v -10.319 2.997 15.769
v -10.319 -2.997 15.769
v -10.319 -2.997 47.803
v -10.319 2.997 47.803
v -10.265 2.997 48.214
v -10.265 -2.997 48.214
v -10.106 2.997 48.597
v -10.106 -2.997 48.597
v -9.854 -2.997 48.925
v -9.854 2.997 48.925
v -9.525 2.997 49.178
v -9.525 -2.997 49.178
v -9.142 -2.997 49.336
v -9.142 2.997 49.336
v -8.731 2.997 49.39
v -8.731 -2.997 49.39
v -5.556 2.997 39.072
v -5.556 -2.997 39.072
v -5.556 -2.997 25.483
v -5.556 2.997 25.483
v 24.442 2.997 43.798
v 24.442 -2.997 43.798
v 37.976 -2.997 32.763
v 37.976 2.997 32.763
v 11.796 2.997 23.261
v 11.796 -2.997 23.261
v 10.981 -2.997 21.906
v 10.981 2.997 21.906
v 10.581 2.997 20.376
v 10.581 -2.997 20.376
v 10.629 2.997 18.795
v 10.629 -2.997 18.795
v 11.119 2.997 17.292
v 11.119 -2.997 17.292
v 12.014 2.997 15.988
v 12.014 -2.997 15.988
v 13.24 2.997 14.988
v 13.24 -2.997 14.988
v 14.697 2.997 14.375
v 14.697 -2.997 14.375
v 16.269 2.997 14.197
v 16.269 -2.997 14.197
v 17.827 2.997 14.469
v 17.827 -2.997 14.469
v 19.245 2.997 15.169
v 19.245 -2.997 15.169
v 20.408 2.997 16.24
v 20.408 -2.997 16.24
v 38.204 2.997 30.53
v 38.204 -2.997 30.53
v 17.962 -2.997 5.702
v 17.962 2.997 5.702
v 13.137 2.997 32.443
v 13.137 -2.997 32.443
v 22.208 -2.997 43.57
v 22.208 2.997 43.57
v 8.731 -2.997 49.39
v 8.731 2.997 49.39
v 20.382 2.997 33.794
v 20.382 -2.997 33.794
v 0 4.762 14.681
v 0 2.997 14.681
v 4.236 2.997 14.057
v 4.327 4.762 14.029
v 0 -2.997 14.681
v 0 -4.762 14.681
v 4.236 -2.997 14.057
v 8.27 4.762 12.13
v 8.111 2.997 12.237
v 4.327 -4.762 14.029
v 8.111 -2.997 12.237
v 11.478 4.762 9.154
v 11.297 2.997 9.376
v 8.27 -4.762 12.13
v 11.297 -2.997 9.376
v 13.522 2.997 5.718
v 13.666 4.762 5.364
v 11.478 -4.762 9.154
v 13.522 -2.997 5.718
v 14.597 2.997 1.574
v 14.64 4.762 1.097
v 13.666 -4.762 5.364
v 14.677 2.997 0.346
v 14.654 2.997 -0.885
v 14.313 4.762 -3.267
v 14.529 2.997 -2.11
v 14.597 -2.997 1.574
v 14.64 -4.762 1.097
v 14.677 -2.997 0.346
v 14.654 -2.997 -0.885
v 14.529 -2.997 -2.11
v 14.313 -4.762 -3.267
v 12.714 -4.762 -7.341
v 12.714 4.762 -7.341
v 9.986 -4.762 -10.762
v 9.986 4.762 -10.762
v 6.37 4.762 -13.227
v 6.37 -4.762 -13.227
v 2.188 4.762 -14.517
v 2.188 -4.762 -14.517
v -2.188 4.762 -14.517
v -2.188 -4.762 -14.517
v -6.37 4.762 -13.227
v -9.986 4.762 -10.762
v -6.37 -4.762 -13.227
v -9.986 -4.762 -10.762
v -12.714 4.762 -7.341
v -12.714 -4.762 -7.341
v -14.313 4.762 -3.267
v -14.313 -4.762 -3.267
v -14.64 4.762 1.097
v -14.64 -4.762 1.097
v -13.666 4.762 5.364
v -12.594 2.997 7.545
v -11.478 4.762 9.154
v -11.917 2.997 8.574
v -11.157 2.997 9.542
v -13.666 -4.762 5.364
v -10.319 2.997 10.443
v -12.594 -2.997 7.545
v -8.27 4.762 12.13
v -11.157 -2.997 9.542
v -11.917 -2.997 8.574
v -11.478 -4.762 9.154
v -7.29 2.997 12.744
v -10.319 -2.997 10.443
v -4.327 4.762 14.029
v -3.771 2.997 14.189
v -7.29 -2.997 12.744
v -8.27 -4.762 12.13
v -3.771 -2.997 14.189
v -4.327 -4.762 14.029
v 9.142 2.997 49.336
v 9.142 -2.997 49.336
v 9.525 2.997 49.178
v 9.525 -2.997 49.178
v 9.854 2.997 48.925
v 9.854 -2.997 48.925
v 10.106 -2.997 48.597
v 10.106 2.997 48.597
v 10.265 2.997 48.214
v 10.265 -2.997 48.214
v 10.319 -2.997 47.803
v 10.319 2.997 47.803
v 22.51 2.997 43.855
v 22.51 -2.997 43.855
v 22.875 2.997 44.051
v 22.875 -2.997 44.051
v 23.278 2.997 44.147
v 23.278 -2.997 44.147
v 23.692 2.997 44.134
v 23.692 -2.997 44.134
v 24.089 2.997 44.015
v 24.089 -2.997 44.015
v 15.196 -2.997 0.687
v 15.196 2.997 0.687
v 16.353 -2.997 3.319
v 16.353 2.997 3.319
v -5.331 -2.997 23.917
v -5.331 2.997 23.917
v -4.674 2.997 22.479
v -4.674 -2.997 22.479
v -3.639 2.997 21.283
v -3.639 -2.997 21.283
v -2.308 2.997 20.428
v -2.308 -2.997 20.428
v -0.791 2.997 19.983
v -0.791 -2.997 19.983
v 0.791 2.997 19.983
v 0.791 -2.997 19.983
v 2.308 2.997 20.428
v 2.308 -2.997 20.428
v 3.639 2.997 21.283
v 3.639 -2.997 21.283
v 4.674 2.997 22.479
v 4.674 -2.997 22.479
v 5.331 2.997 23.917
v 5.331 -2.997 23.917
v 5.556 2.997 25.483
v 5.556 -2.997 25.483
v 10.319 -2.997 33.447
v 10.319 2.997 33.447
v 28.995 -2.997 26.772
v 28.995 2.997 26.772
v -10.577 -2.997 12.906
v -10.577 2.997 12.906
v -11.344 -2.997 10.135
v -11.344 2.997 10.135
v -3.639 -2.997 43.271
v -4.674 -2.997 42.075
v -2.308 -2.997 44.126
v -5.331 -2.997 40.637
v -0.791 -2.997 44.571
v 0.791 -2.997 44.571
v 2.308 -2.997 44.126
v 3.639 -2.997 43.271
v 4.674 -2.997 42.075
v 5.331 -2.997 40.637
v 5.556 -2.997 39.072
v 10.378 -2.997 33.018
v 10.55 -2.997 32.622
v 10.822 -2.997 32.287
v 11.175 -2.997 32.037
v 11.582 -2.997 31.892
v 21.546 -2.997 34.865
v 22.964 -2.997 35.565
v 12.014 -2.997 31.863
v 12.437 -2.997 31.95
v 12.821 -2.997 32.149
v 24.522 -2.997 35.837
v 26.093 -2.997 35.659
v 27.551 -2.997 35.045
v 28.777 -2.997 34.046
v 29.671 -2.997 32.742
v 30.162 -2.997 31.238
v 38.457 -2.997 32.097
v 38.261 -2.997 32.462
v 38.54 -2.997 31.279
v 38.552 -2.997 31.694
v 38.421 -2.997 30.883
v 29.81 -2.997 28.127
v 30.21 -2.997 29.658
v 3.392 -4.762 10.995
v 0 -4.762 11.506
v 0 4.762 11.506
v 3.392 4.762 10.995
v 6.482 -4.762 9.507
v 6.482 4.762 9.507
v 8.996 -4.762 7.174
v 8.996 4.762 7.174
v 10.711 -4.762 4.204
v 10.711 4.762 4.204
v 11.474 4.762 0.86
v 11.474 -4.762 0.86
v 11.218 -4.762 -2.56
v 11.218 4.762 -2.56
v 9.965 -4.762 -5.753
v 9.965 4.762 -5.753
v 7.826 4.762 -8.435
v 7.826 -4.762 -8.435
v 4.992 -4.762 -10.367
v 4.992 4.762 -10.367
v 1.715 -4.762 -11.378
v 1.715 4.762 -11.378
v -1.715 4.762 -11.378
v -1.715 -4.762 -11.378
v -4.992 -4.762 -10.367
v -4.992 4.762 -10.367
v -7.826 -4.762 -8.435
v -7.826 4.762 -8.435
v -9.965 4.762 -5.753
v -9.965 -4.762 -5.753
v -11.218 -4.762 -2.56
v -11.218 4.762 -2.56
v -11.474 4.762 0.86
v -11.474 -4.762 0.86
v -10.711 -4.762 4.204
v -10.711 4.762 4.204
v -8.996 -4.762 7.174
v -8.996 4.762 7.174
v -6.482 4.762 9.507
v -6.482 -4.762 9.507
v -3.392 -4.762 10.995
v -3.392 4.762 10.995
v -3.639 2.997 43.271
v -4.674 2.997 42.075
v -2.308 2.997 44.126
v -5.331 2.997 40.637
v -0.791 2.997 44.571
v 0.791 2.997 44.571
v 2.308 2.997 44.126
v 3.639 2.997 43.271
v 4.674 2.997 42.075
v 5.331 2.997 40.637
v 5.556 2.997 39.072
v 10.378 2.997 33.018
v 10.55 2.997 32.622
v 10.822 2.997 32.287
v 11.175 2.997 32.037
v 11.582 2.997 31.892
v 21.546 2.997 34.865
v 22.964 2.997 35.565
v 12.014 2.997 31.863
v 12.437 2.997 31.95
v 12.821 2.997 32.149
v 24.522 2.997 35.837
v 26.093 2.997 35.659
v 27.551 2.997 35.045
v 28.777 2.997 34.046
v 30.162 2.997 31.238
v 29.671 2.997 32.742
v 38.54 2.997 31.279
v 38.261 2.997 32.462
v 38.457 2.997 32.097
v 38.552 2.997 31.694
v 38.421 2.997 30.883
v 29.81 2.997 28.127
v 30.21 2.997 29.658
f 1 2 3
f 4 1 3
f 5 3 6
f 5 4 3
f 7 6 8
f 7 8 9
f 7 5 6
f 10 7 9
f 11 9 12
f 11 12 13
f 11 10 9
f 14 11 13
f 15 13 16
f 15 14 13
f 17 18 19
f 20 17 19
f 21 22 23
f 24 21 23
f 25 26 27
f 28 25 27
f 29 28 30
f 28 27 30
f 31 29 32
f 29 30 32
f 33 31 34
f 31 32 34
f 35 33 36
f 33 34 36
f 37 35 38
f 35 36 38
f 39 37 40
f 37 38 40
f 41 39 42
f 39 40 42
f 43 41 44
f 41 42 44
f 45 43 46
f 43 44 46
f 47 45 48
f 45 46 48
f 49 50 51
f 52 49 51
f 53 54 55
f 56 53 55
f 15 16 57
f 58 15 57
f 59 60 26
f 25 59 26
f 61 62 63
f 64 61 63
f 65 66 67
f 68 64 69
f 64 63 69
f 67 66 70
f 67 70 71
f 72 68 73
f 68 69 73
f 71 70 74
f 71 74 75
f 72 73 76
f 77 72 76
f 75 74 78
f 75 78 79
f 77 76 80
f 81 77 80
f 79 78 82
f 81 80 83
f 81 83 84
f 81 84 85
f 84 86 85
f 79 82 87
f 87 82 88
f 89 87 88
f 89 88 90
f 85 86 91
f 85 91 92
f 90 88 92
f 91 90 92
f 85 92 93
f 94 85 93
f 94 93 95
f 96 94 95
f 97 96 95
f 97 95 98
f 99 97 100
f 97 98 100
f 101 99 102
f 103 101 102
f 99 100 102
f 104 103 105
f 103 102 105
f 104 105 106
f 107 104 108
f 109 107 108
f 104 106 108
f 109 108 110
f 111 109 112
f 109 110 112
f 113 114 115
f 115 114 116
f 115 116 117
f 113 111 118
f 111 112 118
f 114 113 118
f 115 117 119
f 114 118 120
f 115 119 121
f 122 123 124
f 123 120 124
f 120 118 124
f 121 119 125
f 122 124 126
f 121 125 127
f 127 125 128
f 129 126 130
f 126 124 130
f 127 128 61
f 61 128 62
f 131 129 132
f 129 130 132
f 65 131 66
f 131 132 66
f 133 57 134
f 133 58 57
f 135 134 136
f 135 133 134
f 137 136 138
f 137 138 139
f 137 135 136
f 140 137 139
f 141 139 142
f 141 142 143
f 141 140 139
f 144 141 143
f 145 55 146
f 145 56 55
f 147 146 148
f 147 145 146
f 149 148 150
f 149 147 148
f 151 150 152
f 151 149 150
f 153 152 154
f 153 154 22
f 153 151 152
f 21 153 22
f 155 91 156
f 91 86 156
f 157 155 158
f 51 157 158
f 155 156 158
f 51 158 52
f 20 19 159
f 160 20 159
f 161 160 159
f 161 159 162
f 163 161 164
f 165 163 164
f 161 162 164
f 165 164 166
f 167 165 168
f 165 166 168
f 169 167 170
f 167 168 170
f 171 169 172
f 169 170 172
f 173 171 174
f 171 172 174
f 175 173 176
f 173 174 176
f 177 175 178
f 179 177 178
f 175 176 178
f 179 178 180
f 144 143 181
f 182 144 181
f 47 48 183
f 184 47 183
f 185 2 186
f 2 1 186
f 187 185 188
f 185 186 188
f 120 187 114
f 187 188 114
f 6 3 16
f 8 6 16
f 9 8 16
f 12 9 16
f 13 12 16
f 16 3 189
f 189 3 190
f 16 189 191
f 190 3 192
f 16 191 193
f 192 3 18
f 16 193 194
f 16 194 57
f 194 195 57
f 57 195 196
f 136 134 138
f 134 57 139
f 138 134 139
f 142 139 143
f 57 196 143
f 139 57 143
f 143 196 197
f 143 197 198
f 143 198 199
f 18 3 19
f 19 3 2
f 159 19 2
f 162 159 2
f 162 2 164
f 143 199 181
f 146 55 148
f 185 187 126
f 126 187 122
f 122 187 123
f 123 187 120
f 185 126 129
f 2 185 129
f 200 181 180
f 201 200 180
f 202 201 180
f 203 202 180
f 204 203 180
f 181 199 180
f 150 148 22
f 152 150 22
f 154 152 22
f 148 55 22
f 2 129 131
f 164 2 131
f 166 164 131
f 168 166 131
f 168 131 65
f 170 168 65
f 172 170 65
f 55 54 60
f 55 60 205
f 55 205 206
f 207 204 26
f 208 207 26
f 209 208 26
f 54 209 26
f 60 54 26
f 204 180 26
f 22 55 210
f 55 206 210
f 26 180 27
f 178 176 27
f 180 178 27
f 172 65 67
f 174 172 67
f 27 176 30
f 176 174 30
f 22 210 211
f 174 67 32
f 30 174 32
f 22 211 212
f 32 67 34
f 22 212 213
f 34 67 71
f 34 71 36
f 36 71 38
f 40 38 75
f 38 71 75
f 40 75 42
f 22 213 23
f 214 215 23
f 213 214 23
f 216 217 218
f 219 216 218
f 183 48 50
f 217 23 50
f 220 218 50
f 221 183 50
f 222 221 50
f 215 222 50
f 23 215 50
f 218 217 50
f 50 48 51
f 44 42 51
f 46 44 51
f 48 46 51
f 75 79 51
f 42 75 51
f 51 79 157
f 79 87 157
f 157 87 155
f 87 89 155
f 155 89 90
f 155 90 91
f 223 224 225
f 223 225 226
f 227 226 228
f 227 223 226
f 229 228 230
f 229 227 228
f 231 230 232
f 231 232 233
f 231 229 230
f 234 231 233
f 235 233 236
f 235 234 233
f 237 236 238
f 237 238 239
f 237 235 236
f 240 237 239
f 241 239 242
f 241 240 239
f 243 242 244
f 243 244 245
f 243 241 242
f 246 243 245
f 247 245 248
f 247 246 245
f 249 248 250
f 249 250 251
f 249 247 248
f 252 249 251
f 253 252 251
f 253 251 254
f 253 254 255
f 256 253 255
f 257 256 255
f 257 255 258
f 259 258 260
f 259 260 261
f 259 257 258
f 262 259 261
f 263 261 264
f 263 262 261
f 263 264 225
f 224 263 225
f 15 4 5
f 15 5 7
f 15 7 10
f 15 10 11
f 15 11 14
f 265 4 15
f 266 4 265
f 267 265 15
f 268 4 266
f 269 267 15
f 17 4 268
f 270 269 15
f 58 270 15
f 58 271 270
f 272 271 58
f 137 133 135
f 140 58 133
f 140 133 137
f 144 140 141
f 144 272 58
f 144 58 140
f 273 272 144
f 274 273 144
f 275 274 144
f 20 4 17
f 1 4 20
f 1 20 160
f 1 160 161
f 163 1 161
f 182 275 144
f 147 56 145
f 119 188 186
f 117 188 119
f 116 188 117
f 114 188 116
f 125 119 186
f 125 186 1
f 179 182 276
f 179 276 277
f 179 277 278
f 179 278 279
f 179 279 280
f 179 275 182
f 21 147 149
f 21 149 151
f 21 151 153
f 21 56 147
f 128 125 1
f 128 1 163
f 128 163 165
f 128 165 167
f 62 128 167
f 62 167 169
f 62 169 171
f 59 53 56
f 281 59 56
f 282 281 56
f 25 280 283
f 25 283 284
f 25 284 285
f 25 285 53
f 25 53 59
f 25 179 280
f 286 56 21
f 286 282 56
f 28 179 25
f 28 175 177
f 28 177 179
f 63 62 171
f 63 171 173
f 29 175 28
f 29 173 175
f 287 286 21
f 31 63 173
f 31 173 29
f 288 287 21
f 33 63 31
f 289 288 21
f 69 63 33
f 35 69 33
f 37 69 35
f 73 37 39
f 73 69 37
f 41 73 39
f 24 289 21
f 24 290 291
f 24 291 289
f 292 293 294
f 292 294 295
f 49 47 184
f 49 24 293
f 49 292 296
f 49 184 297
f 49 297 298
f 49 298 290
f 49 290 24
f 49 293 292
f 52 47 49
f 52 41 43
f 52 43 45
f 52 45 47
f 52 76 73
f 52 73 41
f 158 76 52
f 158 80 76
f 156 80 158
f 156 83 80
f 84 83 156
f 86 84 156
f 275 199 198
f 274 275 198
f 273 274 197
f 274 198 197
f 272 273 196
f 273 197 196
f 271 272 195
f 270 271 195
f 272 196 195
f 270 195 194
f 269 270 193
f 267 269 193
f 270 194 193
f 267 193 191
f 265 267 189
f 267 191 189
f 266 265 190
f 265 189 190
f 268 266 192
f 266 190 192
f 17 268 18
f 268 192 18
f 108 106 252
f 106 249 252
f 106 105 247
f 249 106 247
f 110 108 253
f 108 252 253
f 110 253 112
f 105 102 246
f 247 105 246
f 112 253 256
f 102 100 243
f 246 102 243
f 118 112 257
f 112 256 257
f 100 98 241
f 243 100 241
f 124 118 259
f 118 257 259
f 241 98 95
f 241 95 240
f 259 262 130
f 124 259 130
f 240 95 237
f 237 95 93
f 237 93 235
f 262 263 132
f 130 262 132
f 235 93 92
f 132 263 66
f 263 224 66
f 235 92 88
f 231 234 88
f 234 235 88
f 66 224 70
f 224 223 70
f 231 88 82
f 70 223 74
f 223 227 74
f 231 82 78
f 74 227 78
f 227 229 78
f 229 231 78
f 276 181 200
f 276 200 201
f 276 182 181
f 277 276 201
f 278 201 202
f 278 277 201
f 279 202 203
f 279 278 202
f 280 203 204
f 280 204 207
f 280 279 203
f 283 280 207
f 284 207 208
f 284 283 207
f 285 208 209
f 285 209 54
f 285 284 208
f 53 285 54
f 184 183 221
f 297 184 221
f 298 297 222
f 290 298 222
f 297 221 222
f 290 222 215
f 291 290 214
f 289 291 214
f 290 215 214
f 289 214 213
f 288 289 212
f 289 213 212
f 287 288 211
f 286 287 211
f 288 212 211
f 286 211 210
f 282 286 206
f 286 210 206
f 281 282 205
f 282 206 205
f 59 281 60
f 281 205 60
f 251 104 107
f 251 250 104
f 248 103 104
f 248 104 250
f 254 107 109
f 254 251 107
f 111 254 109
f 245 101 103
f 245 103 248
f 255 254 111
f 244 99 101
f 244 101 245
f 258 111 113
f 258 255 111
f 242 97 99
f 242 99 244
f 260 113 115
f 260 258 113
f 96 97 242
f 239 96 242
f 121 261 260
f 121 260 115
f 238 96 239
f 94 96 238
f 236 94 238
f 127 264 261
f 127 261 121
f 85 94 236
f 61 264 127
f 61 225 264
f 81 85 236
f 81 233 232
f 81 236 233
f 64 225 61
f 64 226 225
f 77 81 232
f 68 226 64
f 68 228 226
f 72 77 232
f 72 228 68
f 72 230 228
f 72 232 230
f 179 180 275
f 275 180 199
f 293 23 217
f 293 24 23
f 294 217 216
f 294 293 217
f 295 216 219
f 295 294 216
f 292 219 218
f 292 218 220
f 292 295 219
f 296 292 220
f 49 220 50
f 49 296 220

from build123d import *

# Parameters (mm, degrees)
BOSS_EXTRUDE1_DEPTH      = 4.7625
BOSS_EXTRUDE1_DEPTH_BACK = 4.7625
SKETCH1_R                = 14.6812
SKETCH1_R_2              = 11.5062
BOSS_EXTRUDE2_DEPTH      = 2.9972
BOSS_EXTRUDE2_DEPTH_BACK = 2.9972
FILLET1_R                = 16.002
FILLET2_R                = 1.5875


with BuildPart() as part:
    # Sketch1 → Boss-Extrude1 (new, two sides: drawn at the far end of the back side and taken through both)
    with BuildSketch(Plane(origin=(0, 0, 0), x_dir=(1, 0, 0), z_dir=(0, 1, 0)).offset(-BOSS_EXTRUDE1_DEPTH_BACK)):
        with Locations(Location((0, 0, 0), (0, 0, 270))):
            Circle(SKETCH1_R)
        with Locations(Location((0, 0, 0), (0, 0, 270))):
            Circle(SKETCH1_R_2, mode=Mode.SUBTRACT)
    extrude(amount=BOSS_EXTRUDE1_DEPTH + BOSS_EXTRUDE1_DEPTH_BACK)

    # Sketch1<4> → Boss-Extrude2 (add, two sides: drawn at the far end of the back side and taken through both)
    with BuildSketch(Plane(origin=(0, 0, 0), x_dir=(1, 0, 0), z_dir=(0, 1, 0)).offset(-BOSS_EXTRUDE2_DEPTH_BACK)):
        with BuildLine():
            Line((-10.31875, -10.443228997), (-10.31875, -49.3903))
            Line((-10.31875, -49.3903), (10.31875, -49.3903))
            Line((10.31875, -49.3903), (10.31875, -28.986981317))
            Line((10.31875, -28.986981317), (23.211292264, -44.800828643))
            Line((23.211292264, -44.800828643), (39.206644749, -31.760310817))
            Line((39.206644749, -31.760310817), (14.596591512, -1.573896333))
            ThreePointArc((14.596591512, -1.573896333), (4.923540137, -13.830993672), (-10.31875, -10.443228997))
        make_face()
        with BuildLine():
            Line((-5.55625, -39.07155), (-5.55625, -25.48255))
            ThreePointArc((-5.55625, -25.48255), (0, -19.9263), (5.55625, -25.48255))
            Line((5.55625, -25.48255), (5.55625, -39.07155))
            ThreePointArc((5.55625, -39.07155), (0, -44.6278), (-5.55625, -39.07155))
        make_face(mode=Mode.SUBTRACT)
        with BuildLine():
            Line((20.38226854, -33.793802133), (11.795589111, -23.261477728))
            ThreePointArc((11.795589111, -23.261477728), (12.591121519, -15.444128029), (20.408471218, -16.239660438))
            Line((20.408471218, -16.239660438), (28.995150647, -26.771984843))
            ThreePointArc((28.995150647, -26.771984843), (28.199618239, -34.589334541), (20.38226854, -33.793802133))
        make_face(mode=Mode.SUBTRACT)
    extrude(amount=BOSS_EXTRUDE2_DEPTH + BOSS_EXTRUDE2_DEPTH_BACK)

    # Fillet1
    fillet1_edges = [part.edges().sort_by_distance(p)[0] for p in [
        (-10.31875, 0, 10.443228997),
        (14.596591512, 0, 1.573896333),
    ]]
    fillet(fillet1_edges, radius=FILLET1_R)

    # Fillet2
    fillet2_edges = [part.edges().sort_by_distance(p)[0] for p in [
        (39.206644749, 0, 31.760310817),
        (23.211292264, 0, 44.800828643),
        (10.31875, 0, 28.986981317),
        (10.31875, 0, 49.3903),
        (-10.31875, 0, 49.3903),
    ]]
    fillet(fillet2_edges, radius=FILLET2_R)


solid = part.part
